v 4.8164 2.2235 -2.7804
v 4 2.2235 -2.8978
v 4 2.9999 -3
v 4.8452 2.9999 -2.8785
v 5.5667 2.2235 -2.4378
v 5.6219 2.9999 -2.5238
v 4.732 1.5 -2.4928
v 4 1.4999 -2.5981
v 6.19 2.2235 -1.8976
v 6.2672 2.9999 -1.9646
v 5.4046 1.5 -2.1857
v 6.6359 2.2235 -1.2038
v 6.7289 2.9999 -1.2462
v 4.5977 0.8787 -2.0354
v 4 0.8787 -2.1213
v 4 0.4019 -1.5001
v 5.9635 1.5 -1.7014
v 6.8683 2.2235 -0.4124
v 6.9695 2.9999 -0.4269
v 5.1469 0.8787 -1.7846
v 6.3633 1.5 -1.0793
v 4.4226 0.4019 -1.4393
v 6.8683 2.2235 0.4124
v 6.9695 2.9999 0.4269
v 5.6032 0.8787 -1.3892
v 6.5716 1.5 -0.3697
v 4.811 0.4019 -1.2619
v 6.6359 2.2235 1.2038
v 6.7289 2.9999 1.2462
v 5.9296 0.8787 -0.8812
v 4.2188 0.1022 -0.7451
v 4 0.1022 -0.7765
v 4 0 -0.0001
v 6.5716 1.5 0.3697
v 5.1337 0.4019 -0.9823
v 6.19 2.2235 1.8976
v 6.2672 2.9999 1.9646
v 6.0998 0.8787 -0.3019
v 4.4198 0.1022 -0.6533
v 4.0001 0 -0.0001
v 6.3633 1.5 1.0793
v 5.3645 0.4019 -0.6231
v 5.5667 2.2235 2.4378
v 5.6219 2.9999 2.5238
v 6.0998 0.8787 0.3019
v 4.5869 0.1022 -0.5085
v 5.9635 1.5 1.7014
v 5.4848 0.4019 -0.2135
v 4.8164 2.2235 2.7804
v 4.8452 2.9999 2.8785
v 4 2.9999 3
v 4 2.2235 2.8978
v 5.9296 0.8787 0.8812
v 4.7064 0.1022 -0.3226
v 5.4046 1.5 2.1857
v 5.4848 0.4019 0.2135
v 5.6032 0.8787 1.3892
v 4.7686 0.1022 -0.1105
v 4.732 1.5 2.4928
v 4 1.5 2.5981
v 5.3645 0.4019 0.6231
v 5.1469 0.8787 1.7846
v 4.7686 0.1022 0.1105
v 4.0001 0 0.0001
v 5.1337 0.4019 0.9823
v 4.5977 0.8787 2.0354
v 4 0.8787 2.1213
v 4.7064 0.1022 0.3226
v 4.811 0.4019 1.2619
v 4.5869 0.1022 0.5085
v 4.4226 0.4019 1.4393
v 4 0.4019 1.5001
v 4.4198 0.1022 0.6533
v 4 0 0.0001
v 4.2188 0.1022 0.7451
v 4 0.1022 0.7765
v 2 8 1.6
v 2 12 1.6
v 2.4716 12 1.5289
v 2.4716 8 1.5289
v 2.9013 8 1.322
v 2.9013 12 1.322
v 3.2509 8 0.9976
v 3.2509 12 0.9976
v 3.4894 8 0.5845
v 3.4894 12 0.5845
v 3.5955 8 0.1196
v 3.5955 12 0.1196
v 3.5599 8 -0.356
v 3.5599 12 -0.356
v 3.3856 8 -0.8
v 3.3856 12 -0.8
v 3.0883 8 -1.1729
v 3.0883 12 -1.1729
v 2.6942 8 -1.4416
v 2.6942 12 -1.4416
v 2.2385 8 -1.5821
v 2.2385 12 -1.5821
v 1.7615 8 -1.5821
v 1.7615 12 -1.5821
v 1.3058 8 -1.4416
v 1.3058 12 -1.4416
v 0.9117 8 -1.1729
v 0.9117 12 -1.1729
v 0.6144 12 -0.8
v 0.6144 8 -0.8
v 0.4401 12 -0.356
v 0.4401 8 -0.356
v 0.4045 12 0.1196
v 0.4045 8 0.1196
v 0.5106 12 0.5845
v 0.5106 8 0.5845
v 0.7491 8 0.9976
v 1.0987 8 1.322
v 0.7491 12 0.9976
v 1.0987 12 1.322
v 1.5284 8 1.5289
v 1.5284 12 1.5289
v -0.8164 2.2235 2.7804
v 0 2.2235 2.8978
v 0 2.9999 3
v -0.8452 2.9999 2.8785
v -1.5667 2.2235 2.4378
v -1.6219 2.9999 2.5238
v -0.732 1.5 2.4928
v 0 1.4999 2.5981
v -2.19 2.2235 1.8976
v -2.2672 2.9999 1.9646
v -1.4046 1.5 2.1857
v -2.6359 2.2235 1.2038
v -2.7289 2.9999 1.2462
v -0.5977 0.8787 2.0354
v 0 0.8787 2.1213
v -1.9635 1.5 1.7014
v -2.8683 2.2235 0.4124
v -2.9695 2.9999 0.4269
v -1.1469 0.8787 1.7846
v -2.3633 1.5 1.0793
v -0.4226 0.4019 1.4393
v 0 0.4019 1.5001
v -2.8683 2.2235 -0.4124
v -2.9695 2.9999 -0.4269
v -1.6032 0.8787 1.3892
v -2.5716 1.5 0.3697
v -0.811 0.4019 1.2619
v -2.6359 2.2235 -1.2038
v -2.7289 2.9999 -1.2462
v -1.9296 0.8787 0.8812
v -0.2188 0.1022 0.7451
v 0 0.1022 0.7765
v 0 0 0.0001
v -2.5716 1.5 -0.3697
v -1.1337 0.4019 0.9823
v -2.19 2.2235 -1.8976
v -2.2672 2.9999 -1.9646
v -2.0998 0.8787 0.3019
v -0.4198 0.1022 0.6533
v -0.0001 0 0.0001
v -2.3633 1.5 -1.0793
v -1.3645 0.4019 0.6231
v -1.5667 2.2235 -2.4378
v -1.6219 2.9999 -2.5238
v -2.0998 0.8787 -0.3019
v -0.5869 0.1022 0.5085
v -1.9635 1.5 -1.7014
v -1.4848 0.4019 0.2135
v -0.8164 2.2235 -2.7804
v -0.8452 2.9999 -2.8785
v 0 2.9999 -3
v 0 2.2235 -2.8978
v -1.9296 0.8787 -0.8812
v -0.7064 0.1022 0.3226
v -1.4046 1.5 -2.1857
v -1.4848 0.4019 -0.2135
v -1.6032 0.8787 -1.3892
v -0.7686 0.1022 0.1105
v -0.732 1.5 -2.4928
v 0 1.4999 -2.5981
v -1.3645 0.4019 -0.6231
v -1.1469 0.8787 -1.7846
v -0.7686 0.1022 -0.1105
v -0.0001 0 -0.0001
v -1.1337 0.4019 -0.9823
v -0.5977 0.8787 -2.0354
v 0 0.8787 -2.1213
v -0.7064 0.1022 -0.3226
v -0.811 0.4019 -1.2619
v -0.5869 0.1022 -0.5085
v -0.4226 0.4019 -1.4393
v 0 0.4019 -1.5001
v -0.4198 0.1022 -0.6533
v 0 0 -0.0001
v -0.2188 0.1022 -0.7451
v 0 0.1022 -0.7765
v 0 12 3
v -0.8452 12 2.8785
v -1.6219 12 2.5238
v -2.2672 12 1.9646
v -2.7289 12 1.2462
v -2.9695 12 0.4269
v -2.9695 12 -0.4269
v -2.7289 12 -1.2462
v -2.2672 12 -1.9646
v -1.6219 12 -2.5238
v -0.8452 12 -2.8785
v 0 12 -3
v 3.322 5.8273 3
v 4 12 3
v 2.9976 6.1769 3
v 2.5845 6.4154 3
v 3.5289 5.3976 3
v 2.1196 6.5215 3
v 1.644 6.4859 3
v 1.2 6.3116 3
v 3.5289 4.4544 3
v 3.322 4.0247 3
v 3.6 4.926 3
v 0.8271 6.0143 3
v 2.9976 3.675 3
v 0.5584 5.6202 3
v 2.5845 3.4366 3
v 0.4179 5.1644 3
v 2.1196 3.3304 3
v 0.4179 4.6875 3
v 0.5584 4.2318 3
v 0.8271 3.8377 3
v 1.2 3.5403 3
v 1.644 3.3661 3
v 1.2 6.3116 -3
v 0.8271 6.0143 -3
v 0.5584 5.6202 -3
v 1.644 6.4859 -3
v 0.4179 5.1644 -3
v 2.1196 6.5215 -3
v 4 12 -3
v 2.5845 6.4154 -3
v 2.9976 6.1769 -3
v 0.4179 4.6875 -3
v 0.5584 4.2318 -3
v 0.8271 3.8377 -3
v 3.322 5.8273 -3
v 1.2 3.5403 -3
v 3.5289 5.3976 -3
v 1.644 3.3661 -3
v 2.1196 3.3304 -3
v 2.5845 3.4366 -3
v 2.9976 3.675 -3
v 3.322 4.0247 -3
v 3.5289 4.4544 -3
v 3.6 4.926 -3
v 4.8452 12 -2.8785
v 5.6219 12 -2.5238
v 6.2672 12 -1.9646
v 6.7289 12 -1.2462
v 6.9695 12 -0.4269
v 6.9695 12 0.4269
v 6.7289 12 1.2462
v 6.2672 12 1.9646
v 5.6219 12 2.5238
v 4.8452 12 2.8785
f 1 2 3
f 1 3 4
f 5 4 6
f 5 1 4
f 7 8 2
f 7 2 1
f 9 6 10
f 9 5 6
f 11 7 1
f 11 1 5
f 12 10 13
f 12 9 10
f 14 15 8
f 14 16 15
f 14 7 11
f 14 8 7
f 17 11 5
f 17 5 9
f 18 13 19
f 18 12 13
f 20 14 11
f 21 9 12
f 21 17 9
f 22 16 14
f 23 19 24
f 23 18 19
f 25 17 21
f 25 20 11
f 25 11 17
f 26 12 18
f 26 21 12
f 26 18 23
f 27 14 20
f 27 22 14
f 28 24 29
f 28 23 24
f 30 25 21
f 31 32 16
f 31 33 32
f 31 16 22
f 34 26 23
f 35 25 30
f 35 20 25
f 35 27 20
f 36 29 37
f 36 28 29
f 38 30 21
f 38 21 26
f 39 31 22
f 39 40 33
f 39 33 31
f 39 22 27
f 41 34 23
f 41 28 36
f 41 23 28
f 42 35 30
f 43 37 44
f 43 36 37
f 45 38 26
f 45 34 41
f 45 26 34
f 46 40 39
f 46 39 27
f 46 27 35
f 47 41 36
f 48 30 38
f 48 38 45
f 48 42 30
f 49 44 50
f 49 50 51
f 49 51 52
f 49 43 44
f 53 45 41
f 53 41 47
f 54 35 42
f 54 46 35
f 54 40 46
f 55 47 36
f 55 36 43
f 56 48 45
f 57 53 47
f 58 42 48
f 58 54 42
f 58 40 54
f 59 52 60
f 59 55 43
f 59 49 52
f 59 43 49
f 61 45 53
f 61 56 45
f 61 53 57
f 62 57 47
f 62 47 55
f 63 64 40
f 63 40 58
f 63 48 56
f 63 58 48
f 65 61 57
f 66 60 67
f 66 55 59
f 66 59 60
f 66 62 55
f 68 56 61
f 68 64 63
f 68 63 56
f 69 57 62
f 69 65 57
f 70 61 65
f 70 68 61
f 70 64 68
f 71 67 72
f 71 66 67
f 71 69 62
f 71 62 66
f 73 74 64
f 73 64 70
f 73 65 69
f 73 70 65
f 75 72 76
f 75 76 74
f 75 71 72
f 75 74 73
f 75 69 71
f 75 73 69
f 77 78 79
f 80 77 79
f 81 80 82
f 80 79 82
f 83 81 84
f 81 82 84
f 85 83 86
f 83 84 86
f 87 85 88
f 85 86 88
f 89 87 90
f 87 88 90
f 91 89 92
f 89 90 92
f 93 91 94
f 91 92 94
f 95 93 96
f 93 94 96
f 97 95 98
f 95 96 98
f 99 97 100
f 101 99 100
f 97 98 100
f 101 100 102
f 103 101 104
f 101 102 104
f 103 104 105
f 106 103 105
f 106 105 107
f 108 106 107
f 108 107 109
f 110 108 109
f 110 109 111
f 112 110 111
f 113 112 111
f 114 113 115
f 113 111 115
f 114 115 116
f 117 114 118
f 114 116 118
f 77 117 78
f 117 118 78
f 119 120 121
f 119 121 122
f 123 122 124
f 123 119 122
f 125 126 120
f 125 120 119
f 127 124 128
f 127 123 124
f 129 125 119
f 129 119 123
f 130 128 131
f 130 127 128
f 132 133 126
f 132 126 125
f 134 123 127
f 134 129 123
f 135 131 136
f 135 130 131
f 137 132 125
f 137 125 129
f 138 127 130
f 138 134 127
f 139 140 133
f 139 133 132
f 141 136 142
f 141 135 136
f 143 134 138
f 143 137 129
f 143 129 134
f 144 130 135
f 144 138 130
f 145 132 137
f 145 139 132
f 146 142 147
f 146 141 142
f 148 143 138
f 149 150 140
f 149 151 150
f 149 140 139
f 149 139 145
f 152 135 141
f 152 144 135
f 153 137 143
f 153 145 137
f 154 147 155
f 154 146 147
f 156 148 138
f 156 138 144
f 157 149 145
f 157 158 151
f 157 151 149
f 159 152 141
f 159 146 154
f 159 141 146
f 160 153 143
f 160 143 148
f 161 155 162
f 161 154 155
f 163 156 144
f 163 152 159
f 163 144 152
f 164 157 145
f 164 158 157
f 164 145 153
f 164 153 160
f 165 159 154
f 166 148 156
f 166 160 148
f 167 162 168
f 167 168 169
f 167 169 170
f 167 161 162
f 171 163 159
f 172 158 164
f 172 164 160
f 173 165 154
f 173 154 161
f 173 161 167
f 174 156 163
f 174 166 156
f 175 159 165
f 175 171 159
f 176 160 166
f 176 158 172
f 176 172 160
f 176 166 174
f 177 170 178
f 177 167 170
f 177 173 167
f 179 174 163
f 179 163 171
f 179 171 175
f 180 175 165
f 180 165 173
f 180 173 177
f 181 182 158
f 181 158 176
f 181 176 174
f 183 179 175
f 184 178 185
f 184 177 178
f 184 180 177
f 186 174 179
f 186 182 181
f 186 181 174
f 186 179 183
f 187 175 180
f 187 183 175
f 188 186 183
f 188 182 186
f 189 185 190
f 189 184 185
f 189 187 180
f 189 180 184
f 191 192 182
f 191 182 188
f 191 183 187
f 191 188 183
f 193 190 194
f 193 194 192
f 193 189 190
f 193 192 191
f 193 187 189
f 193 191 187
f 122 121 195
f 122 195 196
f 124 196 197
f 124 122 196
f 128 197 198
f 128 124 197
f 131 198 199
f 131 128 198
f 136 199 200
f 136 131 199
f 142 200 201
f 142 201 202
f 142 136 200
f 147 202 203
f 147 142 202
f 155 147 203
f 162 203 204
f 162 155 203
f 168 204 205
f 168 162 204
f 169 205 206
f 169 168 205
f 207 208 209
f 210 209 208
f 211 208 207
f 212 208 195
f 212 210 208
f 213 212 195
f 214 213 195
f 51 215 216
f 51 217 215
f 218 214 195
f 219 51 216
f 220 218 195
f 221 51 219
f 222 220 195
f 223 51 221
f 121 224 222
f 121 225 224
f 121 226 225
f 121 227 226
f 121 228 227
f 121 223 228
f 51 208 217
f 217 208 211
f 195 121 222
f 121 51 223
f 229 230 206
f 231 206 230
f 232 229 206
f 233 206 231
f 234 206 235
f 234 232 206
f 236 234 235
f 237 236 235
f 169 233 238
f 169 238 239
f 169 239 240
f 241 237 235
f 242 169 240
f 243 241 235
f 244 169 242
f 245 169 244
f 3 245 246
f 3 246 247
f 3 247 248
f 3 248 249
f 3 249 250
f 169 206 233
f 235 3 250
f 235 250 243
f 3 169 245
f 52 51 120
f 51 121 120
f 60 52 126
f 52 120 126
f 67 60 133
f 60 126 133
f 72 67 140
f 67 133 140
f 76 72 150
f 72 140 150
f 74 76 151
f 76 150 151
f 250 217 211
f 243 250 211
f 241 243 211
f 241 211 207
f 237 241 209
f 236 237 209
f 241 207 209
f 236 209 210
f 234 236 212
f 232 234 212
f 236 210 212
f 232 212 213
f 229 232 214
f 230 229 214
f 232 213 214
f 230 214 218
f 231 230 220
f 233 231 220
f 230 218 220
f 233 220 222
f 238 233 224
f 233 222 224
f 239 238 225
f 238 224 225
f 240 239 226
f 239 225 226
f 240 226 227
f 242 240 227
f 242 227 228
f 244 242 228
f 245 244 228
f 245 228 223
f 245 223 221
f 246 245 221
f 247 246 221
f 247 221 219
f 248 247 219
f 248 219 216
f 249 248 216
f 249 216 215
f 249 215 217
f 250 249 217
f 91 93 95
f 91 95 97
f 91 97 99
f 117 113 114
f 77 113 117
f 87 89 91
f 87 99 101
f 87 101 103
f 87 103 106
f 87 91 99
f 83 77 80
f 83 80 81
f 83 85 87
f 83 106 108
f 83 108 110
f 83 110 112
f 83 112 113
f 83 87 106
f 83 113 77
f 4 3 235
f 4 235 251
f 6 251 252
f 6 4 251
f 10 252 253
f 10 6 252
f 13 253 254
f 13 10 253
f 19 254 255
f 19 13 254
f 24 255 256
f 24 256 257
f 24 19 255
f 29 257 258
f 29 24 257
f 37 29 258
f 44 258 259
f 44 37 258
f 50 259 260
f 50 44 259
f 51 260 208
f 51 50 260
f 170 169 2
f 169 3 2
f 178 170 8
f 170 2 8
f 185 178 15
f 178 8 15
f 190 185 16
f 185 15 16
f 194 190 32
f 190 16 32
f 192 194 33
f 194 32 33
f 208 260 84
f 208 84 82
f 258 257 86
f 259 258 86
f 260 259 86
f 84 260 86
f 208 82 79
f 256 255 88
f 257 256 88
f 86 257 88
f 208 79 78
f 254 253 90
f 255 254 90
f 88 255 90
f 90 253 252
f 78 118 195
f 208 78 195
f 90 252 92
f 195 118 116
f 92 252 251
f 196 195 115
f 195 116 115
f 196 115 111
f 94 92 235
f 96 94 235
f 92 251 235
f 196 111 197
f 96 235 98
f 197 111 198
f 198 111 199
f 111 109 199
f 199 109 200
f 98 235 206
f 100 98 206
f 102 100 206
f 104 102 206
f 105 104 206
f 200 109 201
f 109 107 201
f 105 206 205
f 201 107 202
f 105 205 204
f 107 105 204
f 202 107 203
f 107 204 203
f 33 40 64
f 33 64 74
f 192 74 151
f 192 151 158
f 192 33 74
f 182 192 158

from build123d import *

# Parameters (mm, degrees)
BOSS_EXTRUDE1_DEPTH = 12
FILLET3_R           = 3
SKETCH2_R           = 1.6
CUT_EXTRUDE1_DEPTH  = 20
SKETCH4_R           = 1.6
CUT_EXTRUDE2_DEPTH  = 4


with BuildPart() as part:
    # Sketch1 → Boss-Extrude1 (new body)
    with BuildSketch(Plane(origin=(0, 0, 0), x_dir=(1, 0, 0), z_dir=(0, 1, 0))):
        with BuildLine():
            Line((0, 3), (4, 3))
            ThreePointArc((4, 3), (7, 0), (4, -3))
            Line((4, -3), (0, -3))
            ThreePointArc((0, -3), (-3, 0), (0, 3))
        make_face()
    extrude(amount=BOSS_EXTRUDE1_DEPTH)

    # Fillet3
    fillet3_edges = [part.edges().sort_by_distance(p)[0] for p in [
        (2, 0, -3),
        (7, 0, 0),
        (2, 0, 3),
        (-3, 0, 0),
    ]]
    fillet(fillet3_edges, radius=FILLET3_R - 0.0001)  # a hair under: the kernel refuses the full size

    # Sketch2 → Cut-Extrude1 (cut)
    with BuildSketch(Plane.XY.offset(3)):
        with Locations((2, 4.925974627)):
            Circle(SKETCH2_R)
    extrude(amount=-CUT_EXTRUDE1_DEPTH, mode=Mode.SUBTRACT)

    # Sketch4 → Cut-Extrude2 (cut)
    with BuildSketch(Plane(origin=(0, 12, 0), x_dir=(1, 0, 0), z_dir=(0, 1, 0))):
        with Locations(Location((2, 0, 0), (0, 0, 270))):
            Circle(SKETCH4_R)
    extrude(amount=-CUT_EXTRUDE2_DEPTH, mode=Mode.SUBTRACT)


solid = part.part
